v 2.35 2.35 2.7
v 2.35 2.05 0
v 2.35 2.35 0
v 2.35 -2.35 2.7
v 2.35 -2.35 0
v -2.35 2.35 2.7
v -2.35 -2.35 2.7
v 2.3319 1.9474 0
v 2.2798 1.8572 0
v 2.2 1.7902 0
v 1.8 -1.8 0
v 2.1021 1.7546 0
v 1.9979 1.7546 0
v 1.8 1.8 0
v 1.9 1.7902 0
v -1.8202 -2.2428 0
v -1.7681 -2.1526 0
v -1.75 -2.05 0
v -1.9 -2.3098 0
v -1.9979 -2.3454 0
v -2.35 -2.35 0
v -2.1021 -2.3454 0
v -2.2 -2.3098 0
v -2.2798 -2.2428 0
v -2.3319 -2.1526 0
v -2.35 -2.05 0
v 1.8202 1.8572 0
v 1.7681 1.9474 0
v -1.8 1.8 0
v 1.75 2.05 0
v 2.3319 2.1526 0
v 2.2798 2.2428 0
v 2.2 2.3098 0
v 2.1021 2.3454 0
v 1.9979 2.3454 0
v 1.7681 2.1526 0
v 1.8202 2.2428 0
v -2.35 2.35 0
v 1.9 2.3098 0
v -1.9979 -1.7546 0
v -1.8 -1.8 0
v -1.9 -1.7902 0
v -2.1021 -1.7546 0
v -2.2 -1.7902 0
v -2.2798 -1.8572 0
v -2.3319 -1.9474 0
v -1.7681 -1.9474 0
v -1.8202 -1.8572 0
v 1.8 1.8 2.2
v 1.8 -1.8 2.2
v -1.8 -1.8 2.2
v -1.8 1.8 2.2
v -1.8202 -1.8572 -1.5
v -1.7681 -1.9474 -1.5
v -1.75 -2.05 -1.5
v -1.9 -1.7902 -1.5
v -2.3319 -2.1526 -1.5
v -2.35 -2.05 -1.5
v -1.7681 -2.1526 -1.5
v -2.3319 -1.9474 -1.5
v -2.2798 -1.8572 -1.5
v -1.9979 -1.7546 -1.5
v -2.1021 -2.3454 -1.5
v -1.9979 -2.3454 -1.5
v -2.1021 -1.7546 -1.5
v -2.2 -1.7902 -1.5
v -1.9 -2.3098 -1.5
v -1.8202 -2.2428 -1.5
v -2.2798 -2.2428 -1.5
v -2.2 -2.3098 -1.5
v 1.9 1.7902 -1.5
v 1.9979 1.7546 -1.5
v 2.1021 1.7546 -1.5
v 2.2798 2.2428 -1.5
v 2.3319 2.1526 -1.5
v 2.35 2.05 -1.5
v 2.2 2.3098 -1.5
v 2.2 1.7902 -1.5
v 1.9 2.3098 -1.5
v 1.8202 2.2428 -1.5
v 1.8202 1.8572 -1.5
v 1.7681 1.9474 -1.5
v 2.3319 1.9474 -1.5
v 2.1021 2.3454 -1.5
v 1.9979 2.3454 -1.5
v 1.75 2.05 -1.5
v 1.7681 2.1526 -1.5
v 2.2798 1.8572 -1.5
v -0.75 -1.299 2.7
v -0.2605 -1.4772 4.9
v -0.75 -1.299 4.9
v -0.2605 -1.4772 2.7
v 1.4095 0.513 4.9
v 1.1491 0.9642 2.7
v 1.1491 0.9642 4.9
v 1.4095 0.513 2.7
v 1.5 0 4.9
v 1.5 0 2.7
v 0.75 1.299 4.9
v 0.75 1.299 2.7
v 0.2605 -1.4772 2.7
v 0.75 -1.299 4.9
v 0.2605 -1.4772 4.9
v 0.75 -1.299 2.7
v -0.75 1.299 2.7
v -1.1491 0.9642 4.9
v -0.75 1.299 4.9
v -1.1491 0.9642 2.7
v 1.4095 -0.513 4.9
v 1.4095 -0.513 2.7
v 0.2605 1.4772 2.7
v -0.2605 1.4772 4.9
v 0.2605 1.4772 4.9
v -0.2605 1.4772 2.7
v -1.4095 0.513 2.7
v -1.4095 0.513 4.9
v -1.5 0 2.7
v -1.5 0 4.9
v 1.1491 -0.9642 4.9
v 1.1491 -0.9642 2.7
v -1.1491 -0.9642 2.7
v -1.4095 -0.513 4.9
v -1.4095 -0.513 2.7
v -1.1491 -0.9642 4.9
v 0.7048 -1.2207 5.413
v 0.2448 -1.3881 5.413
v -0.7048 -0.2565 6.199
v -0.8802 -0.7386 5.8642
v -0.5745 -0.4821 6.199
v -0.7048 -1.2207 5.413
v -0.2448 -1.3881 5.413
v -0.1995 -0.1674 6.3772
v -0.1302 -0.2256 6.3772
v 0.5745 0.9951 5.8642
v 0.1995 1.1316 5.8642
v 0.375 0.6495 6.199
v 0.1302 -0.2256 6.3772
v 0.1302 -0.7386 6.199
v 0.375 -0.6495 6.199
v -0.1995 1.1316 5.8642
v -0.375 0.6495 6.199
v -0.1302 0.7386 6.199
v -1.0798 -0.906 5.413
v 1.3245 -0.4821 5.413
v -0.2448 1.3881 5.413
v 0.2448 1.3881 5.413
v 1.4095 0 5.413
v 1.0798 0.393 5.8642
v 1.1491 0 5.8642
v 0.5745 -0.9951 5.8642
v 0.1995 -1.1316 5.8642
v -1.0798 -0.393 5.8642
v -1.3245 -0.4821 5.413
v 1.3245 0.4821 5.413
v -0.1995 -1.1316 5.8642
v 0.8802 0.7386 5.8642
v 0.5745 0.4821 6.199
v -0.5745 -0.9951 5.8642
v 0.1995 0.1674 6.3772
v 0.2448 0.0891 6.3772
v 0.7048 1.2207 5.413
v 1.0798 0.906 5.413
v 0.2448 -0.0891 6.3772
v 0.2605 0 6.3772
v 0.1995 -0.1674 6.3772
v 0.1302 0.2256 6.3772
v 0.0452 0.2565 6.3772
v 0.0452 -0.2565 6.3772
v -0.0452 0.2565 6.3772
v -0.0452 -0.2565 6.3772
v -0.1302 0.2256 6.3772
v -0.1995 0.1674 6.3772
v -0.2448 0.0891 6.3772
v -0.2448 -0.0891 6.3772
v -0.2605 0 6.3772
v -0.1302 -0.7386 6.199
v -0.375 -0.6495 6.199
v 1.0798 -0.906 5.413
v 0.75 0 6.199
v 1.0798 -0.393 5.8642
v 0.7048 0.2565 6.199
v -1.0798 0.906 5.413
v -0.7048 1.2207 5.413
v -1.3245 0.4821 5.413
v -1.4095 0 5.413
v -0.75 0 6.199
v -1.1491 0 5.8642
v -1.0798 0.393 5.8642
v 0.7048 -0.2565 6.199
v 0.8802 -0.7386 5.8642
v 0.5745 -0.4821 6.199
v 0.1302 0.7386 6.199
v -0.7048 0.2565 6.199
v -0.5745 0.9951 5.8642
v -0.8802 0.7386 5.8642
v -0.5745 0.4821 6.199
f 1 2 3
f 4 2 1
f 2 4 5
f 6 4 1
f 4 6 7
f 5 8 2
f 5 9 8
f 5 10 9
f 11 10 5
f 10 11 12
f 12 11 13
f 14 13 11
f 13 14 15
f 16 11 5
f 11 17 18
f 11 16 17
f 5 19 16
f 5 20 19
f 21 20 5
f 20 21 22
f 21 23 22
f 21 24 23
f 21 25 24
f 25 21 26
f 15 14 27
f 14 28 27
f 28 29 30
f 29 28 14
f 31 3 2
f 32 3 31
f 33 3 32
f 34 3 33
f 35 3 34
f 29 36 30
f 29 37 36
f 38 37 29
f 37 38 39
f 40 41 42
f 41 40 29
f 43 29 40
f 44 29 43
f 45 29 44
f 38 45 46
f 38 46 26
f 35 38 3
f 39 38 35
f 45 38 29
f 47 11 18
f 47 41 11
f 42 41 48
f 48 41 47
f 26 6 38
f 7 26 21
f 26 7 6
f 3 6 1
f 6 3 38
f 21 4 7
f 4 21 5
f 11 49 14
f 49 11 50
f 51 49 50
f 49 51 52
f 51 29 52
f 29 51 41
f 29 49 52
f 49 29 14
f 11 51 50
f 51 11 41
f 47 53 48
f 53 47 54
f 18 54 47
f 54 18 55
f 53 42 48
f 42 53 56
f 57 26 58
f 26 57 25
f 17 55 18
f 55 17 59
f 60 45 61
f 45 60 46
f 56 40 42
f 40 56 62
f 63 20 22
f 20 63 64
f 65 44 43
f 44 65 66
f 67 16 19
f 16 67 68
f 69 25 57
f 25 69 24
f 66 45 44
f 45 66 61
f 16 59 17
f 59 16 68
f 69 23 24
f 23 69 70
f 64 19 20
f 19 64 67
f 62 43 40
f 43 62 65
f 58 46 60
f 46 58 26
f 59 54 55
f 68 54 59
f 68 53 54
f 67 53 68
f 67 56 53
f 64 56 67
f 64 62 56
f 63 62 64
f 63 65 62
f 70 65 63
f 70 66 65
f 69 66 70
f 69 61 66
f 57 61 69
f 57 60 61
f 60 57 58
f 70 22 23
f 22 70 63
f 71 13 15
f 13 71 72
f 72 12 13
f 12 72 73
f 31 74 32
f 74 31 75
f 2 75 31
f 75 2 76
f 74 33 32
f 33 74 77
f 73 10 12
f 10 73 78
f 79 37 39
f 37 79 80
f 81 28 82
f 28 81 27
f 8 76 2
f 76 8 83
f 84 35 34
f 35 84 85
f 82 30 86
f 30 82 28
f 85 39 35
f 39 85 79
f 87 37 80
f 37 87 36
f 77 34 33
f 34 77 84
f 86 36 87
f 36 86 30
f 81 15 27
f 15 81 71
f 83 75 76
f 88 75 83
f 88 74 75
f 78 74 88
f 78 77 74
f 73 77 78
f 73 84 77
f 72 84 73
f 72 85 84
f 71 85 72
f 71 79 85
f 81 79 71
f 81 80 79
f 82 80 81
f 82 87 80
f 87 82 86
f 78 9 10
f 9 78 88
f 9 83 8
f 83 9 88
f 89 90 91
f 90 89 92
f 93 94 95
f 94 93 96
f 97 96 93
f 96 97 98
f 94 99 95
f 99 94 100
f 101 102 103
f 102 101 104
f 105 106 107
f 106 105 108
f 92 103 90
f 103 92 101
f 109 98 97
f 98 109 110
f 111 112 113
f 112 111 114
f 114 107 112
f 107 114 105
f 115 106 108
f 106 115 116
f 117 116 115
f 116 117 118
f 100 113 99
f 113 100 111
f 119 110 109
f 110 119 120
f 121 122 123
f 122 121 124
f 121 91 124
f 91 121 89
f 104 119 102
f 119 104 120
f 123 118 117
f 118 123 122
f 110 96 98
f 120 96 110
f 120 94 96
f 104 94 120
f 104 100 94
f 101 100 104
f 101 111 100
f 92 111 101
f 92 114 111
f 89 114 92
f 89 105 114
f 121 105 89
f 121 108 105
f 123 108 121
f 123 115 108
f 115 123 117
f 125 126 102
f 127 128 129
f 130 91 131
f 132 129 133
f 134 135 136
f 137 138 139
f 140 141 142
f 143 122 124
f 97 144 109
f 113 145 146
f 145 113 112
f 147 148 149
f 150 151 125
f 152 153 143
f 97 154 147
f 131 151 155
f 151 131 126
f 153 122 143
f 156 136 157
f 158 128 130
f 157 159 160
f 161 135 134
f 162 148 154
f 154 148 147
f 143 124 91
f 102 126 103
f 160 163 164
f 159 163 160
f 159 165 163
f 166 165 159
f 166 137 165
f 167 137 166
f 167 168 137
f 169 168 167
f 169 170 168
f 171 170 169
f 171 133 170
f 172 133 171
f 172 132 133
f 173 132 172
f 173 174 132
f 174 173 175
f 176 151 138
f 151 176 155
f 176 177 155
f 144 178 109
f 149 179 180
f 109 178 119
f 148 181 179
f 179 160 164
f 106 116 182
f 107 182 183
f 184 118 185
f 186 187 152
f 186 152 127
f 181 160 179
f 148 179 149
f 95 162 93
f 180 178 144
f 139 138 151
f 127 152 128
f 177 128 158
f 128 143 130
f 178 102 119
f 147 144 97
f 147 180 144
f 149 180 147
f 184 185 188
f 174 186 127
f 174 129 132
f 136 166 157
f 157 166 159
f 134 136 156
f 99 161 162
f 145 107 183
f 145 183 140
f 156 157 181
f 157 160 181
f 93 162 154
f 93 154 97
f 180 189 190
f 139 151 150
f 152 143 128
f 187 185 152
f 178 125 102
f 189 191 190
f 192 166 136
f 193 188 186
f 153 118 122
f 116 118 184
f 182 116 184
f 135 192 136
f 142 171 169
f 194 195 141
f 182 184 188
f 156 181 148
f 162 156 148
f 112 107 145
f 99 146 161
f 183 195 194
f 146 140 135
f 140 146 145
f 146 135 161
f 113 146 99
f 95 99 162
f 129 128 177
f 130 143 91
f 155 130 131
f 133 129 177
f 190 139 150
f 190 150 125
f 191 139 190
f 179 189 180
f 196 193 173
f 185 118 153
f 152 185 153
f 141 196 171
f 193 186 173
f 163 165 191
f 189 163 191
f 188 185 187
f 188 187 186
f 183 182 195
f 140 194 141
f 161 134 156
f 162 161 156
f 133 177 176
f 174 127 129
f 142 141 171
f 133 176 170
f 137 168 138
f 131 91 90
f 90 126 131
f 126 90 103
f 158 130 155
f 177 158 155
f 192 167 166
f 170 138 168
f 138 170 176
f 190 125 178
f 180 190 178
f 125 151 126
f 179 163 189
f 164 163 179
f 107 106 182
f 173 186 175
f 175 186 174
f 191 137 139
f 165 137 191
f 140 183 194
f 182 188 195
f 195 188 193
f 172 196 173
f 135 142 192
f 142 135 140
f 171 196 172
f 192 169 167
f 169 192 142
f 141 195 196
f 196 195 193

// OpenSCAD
module base()
{
    union()
    {
        difference()
        {
            translate([0, 0, 2.7/2]) cube([4.7, 4.7, 2.7], center=true);
            translate([0, 0, 2.2/2]) cube([3.6, 3.6, 2.2], center=true);
        }
        translate([-2.05, -2.05, -1.5]) cylinder(h=1.5, d=0.6, $fn=18);
        translate([2.05, 2.05, -1.5]) cylinder(h=1.5, d=0.6, $fn=18);
    }
}

module pipe(height, round_face)
{
    if(round_face)
    {
        union()
        {
            cylinder(h=height-1.5, d=3, $fn=18);
            translate([0, 0, height-1.5]) sphere(r=1.5, $fn=18);
        }
    }
    else
    {
        cylinder(h=height, d=3, $fn=18);
    }
};

module VLP_250_R()
{
    base();
    translate([0, 0, 2.7]) pipe(3.7, true);
}

VLP_250_R();
